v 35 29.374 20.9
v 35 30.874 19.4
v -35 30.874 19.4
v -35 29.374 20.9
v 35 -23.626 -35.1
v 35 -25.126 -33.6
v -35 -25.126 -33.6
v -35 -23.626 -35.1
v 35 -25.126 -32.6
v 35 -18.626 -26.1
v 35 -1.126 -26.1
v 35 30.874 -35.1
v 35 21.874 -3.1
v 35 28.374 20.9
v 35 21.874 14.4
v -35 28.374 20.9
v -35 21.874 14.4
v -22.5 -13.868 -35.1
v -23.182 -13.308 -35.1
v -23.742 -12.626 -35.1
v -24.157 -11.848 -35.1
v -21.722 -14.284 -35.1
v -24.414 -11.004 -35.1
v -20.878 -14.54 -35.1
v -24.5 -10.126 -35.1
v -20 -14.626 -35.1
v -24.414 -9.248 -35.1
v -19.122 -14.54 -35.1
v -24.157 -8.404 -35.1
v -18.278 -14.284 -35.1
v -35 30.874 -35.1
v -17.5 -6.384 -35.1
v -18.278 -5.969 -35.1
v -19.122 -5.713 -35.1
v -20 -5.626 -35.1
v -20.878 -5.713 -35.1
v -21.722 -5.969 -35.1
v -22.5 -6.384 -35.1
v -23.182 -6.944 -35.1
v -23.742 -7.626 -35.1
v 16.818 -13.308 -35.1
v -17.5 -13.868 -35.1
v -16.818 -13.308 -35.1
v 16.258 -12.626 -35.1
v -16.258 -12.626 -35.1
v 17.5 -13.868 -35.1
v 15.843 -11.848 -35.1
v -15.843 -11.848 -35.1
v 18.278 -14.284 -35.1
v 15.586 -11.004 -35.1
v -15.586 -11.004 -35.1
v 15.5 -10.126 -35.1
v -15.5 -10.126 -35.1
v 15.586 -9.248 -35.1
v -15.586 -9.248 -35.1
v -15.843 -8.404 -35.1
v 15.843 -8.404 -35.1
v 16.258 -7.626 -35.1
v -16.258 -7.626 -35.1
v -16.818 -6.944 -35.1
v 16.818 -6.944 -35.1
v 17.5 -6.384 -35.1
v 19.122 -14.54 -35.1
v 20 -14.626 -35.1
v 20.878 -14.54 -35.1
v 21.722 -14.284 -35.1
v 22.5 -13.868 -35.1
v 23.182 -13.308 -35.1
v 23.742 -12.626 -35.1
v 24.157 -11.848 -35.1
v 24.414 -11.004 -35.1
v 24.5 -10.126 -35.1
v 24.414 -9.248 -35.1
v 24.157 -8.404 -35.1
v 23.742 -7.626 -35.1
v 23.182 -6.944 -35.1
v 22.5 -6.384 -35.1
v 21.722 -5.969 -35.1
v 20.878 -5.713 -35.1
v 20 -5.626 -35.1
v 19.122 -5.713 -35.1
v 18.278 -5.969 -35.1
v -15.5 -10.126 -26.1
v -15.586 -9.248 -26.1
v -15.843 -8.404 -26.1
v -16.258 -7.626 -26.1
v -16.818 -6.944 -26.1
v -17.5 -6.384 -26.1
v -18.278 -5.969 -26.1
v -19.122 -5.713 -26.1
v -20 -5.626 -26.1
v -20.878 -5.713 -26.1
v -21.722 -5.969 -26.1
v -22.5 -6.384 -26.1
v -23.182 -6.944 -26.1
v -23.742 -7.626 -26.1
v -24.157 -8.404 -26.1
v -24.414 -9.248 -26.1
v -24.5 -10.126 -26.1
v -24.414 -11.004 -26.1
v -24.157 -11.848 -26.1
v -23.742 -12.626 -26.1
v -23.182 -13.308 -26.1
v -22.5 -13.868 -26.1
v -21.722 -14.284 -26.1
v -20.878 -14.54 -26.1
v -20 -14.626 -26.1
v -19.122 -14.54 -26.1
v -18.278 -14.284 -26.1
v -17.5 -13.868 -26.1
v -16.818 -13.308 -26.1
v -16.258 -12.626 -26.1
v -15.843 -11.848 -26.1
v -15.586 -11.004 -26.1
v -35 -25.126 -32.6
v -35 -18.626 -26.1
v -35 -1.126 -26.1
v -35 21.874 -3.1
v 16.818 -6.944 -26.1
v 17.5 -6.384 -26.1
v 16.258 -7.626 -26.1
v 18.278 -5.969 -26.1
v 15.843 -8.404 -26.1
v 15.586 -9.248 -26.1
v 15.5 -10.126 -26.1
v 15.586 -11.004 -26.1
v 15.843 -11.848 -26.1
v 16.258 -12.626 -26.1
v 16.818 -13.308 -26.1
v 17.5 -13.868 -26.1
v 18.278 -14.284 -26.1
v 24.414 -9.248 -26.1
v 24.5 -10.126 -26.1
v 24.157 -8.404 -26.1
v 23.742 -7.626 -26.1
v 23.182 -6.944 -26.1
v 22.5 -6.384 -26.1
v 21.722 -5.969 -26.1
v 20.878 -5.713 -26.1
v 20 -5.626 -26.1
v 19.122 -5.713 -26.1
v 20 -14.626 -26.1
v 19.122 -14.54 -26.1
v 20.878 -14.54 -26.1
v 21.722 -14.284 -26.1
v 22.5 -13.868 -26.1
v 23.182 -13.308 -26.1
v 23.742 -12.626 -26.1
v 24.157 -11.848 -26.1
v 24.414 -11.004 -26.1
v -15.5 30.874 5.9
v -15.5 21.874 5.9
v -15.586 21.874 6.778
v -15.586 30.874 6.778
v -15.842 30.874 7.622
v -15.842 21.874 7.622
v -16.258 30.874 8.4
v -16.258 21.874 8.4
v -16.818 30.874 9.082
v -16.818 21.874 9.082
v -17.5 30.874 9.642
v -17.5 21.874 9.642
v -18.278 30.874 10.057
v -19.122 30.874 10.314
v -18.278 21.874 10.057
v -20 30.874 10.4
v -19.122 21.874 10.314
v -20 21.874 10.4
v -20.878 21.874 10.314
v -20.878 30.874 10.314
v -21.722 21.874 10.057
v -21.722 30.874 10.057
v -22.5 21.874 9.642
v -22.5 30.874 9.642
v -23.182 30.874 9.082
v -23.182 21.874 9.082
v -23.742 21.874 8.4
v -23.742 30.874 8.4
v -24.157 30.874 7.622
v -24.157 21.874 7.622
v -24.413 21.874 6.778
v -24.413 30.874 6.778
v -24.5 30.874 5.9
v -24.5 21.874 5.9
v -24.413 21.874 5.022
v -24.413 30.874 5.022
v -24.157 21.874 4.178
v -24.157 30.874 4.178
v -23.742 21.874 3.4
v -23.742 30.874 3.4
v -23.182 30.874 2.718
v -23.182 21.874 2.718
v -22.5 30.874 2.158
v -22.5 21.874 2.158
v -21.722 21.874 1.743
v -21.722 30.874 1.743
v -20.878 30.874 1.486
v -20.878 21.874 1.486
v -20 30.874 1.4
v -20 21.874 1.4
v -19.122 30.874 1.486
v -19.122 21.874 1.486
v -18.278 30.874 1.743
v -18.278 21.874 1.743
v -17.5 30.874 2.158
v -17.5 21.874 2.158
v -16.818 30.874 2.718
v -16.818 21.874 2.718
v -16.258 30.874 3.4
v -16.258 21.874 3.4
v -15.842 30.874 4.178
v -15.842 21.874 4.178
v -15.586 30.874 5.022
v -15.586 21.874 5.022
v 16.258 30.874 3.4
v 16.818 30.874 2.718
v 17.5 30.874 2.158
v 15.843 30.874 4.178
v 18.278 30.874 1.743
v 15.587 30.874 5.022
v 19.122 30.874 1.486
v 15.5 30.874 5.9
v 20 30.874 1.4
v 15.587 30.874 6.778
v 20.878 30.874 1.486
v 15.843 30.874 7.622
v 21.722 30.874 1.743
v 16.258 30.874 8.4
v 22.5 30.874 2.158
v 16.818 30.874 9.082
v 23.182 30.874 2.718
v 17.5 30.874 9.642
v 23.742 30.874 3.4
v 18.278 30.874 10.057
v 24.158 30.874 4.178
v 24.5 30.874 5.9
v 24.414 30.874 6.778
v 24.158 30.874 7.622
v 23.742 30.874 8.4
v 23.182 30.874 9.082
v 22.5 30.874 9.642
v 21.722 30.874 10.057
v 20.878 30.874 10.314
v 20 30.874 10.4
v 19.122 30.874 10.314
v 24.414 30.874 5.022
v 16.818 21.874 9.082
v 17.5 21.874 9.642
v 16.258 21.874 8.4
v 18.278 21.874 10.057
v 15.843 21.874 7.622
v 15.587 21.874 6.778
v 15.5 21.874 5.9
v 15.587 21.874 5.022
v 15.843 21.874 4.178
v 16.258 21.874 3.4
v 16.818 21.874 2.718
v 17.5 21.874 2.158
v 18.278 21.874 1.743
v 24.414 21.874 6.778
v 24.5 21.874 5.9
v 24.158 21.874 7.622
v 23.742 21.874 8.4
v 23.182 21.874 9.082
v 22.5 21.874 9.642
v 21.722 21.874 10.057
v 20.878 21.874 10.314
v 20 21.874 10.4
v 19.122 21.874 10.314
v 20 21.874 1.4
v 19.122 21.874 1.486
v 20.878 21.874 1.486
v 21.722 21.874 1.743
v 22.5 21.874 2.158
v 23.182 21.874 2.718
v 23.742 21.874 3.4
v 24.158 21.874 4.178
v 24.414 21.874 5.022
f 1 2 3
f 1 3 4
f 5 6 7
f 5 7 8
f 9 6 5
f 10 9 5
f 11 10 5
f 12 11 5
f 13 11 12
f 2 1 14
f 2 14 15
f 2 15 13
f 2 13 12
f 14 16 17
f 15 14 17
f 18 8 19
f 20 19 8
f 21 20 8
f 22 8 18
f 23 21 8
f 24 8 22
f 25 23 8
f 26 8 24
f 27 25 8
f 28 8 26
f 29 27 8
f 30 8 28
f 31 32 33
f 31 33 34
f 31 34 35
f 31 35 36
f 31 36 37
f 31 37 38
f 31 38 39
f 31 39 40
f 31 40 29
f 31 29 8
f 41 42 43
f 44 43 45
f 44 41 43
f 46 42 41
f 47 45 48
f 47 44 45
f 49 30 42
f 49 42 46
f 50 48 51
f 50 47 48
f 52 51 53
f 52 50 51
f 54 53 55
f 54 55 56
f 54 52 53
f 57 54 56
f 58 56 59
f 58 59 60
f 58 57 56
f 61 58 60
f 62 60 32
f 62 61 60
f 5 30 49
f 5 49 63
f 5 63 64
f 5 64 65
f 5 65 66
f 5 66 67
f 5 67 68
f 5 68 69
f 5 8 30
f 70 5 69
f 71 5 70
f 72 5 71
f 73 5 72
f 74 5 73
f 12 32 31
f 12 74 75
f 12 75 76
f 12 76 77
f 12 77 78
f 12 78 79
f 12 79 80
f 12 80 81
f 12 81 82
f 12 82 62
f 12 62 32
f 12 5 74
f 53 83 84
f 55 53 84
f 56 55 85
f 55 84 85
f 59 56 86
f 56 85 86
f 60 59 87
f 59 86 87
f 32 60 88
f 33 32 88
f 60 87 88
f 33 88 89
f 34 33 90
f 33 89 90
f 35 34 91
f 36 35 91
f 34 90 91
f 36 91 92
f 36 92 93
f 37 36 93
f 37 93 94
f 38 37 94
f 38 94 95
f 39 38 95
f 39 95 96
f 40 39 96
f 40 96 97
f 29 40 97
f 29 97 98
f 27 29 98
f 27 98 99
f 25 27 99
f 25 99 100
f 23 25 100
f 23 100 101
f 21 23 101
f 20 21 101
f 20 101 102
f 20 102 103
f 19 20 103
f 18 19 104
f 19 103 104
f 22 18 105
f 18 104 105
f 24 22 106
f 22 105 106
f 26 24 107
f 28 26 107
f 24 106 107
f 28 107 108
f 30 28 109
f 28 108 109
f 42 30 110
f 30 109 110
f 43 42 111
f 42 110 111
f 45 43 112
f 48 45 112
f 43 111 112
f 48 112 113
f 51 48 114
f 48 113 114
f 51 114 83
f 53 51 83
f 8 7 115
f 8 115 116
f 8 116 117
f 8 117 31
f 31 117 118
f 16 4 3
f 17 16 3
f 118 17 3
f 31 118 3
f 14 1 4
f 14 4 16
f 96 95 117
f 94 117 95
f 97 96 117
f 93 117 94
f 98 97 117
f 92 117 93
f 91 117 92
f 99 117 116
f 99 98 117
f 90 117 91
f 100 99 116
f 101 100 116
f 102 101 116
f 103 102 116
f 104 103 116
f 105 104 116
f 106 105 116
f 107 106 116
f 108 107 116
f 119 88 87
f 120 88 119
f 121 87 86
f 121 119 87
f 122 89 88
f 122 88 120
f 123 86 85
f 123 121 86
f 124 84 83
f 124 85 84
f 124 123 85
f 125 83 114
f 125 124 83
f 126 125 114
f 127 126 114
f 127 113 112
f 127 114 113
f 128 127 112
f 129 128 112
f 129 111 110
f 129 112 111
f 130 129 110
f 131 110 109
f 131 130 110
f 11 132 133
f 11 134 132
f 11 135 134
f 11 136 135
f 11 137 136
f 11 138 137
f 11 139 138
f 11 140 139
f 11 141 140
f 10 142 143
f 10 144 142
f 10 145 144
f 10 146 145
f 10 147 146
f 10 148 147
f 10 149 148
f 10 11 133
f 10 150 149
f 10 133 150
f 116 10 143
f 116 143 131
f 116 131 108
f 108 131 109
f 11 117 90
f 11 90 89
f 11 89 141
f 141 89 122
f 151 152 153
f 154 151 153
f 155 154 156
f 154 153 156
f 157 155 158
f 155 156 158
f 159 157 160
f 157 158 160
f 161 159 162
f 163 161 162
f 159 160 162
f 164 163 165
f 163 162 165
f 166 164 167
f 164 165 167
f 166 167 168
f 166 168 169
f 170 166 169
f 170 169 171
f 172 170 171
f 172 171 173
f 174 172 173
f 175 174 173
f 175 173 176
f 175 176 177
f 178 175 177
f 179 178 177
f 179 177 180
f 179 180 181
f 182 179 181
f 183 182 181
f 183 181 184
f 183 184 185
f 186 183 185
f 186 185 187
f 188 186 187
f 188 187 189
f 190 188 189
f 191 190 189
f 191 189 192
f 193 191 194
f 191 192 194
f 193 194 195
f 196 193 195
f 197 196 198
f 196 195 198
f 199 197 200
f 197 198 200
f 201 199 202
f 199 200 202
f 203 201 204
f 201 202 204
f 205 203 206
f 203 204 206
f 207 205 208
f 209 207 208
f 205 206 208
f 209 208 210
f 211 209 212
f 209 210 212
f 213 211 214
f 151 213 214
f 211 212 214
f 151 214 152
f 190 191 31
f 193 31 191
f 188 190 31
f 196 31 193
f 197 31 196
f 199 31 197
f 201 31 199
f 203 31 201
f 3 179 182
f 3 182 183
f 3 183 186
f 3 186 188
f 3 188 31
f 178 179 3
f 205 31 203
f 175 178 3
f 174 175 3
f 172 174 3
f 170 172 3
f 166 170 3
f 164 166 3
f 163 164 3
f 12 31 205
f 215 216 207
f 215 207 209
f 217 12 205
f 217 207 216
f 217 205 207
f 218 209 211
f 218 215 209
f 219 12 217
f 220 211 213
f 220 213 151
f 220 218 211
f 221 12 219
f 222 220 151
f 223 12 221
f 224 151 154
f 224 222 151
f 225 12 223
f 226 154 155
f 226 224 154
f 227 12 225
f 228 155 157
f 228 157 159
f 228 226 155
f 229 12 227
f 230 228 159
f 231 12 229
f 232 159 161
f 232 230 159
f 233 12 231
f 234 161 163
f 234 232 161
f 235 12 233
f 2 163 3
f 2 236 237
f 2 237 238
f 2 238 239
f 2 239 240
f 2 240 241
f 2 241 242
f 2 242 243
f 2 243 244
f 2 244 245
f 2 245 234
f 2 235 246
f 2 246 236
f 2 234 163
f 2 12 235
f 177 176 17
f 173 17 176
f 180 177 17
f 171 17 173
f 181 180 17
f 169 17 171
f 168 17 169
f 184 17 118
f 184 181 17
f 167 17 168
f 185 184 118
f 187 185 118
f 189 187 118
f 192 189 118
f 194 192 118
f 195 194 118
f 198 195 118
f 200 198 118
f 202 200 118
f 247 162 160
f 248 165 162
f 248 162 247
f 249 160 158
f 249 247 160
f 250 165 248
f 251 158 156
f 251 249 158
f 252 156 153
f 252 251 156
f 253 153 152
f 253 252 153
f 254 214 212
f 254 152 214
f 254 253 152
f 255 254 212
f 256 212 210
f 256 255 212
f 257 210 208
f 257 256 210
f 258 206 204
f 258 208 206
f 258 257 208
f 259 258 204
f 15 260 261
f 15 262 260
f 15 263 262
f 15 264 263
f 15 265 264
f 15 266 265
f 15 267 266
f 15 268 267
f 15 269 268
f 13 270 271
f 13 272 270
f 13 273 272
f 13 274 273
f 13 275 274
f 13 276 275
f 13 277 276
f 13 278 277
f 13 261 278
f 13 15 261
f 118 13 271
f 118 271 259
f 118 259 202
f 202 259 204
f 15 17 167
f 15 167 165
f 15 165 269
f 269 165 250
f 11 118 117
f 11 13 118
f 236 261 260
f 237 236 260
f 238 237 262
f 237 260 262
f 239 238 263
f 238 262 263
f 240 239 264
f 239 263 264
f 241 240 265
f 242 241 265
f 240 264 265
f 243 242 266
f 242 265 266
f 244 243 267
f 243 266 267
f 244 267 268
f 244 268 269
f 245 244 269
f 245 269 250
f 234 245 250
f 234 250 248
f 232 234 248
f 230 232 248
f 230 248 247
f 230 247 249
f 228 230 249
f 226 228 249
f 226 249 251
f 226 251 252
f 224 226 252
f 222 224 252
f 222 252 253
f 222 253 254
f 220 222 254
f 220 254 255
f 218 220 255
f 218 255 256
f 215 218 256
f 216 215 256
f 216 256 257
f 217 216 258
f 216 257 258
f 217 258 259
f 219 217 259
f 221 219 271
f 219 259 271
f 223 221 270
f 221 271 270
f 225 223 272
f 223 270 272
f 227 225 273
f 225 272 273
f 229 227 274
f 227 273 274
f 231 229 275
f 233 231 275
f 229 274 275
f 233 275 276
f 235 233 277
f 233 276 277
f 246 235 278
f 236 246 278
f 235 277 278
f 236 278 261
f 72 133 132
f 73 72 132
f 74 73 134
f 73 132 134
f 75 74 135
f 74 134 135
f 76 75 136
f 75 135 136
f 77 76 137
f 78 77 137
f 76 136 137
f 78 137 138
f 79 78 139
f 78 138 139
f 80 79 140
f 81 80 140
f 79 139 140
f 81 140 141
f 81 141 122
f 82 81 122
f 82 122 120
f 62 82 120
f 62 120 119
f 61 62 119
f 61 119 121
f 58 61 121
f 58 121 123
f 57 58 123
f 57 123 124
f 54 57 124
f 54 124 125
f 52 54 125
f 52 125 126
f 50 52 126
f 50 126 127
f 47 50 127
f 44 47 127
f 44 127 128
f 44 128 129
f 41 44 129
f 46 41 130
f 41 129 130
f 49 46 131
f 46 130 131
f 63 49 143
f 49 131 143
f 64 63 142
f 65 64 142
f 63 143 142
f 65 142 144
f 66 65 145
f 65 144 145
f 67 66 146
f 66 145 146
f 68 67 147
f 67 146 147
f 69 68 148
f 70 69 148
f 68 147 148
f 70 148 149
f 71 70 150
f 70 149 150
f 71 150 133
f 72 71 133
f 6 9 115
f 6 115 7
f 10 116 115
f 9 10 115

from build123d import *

# Parameters (mm, degrees)
F1_DEPTH = 35
F2_R     = 4.5
F3_DEPTH = 30.87481
F4_R     = 4.5
F5_DEPTH = 35.101


with BuildPart() as f1:
    # F0 (on Right) → F1 (new body, symmetric)
    with BuildSketch(Plane.YZ):
        Polygon((-1.12619, -26.1), (-18.62619, -26.1), (-25.12619, -32.6), (-25.12619, -33.6), (-23.62619, -35.1), (30.87381, -35.1), (30.87381, 19.4), (29.37381, 20.9), (28.37381, 20.9), (21.87381, 14.4), (21.87381, -3.1), align=None)
    extrude(amount=F1_DEPTH, both=True)

    # F2 (on Front) → F3 (cut, through all)
    with BuildSketch(Plane.XZ):
        with Locations((-19.999945, 5.9)):
            Circle(F2_R)
        with Locations((20.000055, 5.9)):
            Circle(F2_R)
    extrude(amount=-F3_DEPTH, mode=Mode.SUBTRACT)

    # F4 (on Top) → F5 (cut, through all)
    with BuildSketch(Plane.XY):
        with Locations((-19.999975, -10.126112)):
            Circle(F4_R)
        with Locations((20.000025, -10.126112)):
            Circle(F4_R)
    extrude(amount=-F5_DEPTH, mode=Mode.SUBTRACT)


solid = f1.part
